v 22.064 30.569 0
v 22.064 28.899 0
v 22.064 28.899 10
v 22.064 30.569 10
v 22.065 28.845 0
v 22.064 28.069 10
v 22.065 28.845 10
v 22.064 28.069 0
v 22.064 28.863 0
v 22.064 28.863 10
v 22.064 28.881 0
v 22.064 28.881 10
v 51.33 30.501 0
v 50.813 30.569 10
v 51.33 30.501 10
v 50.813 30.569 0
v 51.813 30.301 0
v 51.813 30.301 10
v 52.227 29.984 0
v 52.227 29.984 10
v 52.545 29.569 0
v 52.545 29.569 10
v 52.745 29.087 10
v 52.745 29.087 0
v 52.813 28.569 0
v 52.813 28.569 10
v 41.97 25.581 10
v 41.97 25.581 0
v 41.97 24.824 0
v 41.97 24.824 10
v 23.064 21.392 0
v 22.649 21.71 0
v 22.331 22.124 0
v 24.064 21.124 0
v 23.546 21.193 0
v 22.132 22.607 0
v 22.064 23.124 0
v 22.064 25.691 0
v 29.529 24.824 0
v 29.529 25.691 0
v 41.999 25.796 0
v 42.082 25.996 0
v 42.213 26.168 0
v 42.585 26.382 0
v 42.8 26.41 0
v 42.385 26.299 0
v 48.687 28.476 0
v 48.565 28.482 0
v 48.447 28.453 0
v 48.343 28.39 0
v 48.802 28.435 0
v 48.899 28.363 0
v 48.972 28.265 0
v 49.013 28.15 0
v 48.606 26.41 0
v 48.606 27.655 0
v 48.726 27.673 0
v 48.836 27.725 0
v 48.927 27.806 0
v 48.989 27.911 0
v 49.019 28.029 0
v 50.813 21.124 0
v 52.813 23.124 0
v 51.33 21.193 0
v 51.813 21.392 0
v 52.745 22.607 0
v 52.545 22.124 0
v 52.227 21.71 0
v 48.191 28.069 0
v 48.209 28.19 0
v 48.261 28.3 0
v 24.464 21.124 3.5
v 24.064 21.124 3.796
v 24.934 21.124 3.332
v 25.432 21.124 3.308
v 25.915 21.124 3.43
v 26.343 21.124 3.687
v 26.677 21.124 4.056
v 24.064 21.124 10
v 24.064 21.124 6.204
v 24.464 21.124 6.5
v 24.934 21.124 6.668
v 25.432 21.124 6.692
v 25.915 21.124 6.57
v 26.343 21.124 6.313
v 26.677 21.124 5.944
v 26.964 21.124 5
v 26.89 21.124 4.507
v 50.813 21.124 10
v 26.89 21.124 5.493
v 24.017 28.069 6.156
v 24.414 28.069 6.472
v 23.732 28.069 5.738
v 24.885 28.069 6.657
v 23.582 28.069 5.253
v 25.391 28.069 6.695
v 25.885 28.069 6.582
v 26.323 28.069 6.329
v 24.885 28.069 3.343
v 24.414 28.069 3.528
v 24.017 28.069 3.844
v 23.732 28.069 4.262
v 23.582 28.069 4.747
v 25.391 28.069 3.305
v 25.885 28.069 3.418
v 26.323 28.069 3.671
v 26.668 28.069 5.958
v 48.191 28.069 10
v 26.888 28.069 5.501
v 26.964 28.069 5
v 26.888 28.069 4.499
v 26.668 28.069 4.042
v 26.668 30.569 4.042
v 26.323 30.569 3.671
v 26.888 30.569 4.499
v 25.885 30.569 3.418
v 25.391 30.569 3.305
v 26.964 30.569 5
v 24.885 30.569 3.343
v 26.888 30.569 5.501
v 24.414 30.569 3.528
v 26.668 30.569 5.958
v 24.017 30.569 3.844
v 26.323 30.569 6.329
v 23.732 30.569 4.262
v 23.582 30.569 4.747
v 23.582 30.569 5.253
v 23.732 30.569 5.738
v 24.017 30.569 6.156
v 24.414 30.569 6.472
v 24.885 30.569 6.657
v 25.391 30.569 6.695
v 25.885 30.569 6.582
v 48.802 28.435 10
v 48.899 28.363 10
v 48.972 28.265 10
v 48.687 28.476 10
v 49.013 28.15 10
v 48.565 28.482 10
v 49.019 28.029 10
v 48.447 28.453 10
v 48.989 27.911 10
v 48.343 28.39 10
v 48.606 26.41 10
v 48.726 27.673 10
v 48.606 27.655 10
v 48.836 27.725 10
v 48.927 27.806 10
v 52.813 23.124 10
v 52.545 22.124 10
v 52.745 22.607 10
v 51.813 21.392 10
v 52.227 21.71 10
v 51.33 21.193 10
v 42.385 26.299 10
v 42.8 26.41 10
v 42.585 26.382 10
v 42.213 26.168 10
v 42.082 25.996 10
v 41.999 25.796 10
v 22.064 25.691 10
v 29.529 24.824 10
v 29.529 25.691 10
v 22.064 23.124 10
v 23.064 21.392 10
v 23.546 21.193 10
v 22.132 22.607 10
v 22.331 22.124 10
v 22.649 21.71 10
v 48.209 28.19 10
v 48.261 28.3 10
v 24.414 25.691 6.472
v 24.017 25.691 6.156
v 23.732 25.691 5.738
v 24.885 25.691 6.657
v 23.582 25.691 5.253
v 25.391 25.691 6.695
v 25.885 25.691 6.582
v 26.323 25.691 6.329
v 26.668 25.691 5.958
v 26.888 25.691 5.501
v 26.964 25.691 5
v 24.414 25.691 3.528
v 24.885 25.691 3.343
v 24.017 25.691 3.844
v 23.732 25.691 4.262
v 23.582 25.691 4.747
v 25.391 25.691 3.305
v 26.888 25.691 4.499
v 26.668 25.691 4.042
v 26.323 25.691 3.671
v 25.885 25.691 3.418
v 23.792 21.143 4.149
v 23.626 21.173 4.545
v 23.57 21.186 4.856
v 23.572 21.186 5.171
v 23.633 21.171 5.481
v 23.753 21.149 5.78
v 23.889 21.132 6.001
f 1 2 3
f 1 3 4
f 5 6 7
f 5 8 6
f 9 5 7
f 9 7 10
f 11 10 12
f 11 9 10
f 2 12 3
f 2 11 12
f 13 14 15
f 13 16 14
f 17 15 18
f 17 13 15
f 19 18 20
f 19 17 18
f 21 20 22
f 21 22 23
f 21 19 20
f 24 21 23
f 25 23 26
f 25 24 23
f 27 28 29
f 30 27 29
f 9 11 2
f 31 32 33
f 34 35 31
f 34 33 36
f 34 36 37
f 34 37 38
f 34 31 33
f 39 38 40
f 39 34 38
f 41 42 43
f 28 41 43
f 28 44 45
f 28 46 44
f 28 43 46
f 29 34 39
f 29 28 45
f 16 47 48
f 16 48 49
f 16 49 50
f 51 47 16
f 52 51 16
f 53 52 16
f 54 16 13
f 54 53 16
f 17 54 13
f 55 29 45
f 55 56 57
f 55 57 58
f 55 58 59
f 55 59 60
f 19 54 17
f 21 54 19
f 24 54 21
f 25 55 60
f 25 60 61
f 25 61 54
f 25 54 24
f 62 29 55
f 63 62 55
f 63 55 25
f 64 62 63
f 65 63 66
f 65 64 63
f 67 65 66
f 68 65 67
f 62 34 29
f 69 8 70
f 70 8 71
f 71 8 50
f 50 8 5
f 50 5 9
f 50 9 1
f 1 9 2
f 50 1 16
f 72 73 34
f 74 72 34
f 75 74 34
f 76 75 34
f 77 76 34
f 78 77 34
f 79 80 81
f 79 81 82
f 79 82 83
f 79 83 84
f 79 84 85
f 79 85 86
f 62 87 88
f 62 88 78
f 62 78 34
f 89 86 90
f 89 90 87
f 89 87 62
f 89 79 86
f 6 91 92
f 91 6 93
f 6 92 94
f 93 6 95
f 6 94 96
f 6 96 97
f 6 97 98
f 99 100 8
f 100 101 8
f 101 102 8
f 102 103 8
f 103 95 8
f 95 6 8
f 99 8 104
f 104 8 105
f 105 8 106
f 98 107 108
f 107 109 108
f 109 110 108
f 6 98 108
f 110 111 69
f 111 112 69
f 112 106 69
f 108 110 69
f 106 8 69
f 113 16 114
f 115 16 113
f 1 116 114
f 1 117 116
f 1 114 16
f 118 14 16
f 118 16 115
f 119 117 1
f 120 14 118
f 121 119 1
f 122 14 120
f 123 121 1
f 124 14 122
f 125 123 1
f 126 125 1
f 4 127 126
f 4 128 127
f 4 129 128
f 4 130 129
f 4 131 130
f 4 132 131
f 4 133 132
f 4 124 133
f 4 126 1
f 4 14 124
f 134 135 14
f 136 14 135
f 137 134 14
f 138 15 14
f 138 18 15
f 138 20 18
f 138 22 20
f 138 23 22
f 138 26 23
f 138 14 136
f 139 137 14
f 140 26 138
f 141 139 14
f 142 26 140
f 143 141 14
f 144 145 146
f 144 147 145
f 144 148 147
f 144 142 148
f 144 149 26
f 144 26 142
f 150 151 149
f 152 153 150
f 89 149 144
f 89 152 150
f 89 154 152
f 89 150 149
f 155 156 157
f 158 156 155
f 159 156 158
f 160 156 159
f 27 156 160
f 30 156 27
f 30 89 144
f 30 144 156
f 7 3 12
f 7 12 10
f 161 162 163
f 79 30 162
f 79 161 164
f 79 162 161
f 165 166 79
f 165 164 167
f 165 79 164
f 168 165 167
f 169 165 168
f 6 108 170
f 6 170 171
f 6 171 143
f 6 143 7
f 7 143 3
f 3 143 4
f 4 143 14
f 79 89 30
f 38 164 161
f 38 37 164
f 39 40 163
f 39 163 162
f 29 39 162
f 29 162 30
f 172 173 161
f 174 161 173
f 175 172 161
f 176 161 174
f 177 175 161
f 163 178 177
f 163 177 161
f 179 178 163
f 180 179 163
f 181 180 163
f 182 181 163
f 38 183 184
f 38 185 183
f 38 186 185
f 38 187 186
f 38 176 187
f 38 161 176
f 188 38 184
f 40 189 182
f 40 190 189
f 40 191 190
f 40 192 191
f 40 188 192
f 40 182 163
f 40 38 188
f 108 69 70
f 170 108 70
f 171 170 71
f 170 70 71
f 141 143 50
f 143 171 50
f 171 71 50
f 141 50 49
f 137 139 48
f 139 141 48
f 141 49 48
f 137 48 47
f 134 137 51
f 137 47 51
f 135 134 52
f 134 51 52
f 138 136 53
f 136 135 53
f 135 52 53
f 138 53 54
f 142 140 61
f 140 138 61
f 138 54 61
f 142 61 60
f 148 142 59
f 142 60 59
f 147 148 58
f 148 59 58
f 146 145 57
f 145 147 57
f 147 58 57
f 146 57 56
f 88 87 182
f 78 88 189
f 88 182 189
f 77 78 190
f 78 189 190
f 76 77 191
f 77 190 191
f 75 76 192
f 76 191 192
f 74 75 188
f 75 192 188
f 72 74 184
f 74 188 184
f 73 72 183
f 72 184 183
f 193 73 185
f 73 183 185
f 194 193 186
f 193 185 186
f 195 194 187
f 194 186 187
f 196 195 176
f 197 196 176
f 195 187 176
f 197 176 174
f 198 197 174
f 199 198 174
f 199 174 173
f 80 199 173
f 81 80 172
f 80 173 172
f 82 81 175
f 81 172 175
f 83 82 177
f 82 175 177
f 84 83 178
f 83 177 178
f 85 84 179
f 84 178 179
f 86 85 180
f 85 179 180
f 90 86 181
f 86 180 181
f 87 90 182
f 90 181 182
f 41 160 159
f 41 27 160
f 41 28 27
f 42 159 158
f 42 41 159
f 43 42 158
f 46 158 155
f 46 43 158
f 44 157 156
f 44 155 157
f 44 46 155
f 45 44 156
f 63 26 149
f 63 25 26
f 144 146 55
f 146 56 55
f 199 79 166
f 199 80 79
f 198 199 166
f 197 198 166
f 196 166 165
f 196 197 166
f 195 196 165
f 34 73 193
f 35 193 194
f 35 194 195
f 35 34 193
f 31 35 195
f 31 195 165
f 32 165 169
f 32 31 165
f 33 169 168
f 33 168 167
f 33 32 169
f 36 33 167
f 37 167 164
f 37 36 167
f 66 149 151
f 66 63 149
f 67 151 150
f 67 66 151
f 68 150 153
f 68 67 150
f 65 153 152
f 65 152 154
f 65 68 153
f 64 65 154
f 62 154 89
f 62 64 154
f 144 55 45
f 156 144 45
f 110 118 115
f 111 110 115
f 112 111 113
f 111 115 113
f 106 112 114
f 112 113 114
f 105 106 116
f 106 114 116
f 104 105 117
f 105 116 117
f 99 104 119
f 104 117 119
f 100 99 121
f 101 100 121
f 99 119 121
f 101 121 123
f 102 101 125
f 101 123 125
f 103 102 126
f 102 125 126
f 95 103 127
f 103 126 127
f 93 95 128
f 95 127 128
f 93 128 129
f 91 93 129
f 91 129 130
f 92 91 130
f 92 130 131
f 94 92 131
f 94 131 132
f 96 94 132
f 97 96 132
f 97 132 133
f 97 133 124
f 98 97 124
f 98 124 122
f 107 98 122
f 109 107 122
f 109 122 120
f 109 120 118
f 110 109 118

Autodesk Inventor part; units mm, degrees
ref_plane "YZ Plane" through (0, 0, 0) normal (1, 0, 0) x (0, 1, 0)
ref_plane "XZ Plane" through (0, 0, 0) normal (0, 1, 0) x (-1, 0, 0)
ref_plane "XY Plane" through (0, 0, 0) normal (0, 0, 1) x (1, 0, 0)
sketch "Sketch1" plane through (0, 0, 0) normal (0, 0, 1) x (1, 0, 0)
  line L0 (22.0635, 29.031) -> (22.0741, 29.031)
  line L1 (22.0635, 29.031) -> (22.0635, 28.8989)
  arc A0 (22.0635, 28.8989) -> (22.0653, 28.8449) centre (22.893, 28.8989) ccw
  line L2 (22.893, 28.0694) -> (48.1914, 28.0694)
  arc A1 (48.6061, 27.6547) -> (48.1914, 28.0694) centre (48.6061, 28.0694) ccw
  line L3 (48.6061, 27.6547) -> (48.6061, 26.4105)
  line L4 (48.6061, 26.4105) -> (42.7999, 26.4105)
  arc A2 (42.7999, 26.4105) -> (41.9705, 25.581) centre (42.7999, 25.581) ccw
  line L5 (41.9705, 25.581) -> (41.9705, 23.4245)
  line L6 (29.5286, 23.4245) -> (41.9705, 23.4245)
  line L7 (29.5286, 25.6909) -> (29.5286, 23.4245)
  line L8 (22.0635, 25.6909) -> (29.5286, 25.6909)
  line L9 (22.0635, 33.3622) -> (52.8128, 33.3622)
  line L10 (52.8128, 33.3622) -> (52.8128, 19.4198)
  line L11 (52.8128, 19.4198) -> (22.0635, 19.4198)
  line L12 (22.0635, 19.4198) -> (22.0635, 33.3622)
  line L13 (21.7606, 28.8449) -> (22.0653, 28.8449)
  line L14 (56.2668, 28.0694) -> (56.2411, 28.0694)
  line L15 (22.0635, 25.6909) -> (30.348, 25.6909)
  line L16 (42.7999, 26.4105) -> (48.6061, 26.4105)
  line L17 (22.0635, 34.9405) -> (22.0635, 17.9582)
  line L18 (17.0806, 21.0245) -> (52.8128, 21.0245)
  line L19 (48.1914, 28.0694) -> (22.0635, 28.0694)
  line L20 (14.2529, 30.3694) -> (52.8128, 30.3694)
  dimension "d0" = 2.4
  dimension "d2" = 2.3
extrude "Extrusion1" add sketch "Sketch1" along normal blind 10 contours L12 L20 L10 L18 L8 L7 L6 L5 A2 L4 L3 A1 L2 L19 A0 L1 | L12 L9 L10 L20 | L10 L11 L12 L18
sketch "Sketch2" plane through (0, 0, 10) normal (0, 0, 1) x (1, 0, 0)
  line L0 (22.0635, 28.0694) -> (48.1914, 28.0694) projected
  line L1 (41.9705, 23.4245) -> (29.5286, 23.4245) projected
  line L2 (22.0635, 25.6909) -> (22.0635, 19.4198) projected
  line L3 (52.8128, 19.4198) -> (52.8128, 33.3622) projected
  line L4 (22.0635, 33.3622) -> (52.8128, 33.3622)
  line L5 (52.8128, 33.3622) -> (52.8128, 30.5694)
  line L6 (52.8128, 30.5694) -> (22.0635, 30.5694)
  line L7 (22.0635, 30.5694) -> (22.0635, 33.3622)
  line L8 (52.8128, 19.4198) -> (22.0635, 19.4198)
  line L9 (22.0635, 19.4198) -> (22.0635, 21.1245)
  line L10 (22.0635, 21.1245) -> (52.8128, 21.1245)
  line L11 (52.8128, 21.1245) -> (52.8128, 19.4198)
  point P0 (0, 0)
  dimension "d5" = 2.5
  dimension "d6" = 2.3
extrude "Extrusion2" cut sketch "Sketch2" against normal blind 10
fillet "Fillet1" radius 2 3 edges at (52.8128, 30.5694, 5) (52.8128, 21.1245, 5) (22.0635, 21.1245, 5)
sketch "Sketch3" plane through (22.0635, 30.5694, 10) normal (0, 1, 0) x (1, 0, 0)
  line L0 (0, 0) -> (0, 10) projected
  circle A0 centre (3.2, 5) radius 1.7
  point P0 (-22.0635, 10)
  dimension "d10" = 3.4
  dimension "d11" = 3.2
extrude "Extrusion3" cut sketch "Sketch3" against normal blind 10
sketch "Sketch4" plane through (29.5286, 23.4245, 0) normal (0, 1, 0) x (1, 0, 0)
  line L0 (0, 0) -> (12.4418, 0) projected
  line L1 (0, 0) -> (0, -10) projected
  line L2 (12.4418, -10) -> (0, -10) projected
  line L3 (12.4418, 0) -> (12.4418, -10) projected
  point P0 (-29.5286, 0)
extrude "Extrusion4" add sketch "Sketch4" along normal blind 1.4
properties part number "Loop"
